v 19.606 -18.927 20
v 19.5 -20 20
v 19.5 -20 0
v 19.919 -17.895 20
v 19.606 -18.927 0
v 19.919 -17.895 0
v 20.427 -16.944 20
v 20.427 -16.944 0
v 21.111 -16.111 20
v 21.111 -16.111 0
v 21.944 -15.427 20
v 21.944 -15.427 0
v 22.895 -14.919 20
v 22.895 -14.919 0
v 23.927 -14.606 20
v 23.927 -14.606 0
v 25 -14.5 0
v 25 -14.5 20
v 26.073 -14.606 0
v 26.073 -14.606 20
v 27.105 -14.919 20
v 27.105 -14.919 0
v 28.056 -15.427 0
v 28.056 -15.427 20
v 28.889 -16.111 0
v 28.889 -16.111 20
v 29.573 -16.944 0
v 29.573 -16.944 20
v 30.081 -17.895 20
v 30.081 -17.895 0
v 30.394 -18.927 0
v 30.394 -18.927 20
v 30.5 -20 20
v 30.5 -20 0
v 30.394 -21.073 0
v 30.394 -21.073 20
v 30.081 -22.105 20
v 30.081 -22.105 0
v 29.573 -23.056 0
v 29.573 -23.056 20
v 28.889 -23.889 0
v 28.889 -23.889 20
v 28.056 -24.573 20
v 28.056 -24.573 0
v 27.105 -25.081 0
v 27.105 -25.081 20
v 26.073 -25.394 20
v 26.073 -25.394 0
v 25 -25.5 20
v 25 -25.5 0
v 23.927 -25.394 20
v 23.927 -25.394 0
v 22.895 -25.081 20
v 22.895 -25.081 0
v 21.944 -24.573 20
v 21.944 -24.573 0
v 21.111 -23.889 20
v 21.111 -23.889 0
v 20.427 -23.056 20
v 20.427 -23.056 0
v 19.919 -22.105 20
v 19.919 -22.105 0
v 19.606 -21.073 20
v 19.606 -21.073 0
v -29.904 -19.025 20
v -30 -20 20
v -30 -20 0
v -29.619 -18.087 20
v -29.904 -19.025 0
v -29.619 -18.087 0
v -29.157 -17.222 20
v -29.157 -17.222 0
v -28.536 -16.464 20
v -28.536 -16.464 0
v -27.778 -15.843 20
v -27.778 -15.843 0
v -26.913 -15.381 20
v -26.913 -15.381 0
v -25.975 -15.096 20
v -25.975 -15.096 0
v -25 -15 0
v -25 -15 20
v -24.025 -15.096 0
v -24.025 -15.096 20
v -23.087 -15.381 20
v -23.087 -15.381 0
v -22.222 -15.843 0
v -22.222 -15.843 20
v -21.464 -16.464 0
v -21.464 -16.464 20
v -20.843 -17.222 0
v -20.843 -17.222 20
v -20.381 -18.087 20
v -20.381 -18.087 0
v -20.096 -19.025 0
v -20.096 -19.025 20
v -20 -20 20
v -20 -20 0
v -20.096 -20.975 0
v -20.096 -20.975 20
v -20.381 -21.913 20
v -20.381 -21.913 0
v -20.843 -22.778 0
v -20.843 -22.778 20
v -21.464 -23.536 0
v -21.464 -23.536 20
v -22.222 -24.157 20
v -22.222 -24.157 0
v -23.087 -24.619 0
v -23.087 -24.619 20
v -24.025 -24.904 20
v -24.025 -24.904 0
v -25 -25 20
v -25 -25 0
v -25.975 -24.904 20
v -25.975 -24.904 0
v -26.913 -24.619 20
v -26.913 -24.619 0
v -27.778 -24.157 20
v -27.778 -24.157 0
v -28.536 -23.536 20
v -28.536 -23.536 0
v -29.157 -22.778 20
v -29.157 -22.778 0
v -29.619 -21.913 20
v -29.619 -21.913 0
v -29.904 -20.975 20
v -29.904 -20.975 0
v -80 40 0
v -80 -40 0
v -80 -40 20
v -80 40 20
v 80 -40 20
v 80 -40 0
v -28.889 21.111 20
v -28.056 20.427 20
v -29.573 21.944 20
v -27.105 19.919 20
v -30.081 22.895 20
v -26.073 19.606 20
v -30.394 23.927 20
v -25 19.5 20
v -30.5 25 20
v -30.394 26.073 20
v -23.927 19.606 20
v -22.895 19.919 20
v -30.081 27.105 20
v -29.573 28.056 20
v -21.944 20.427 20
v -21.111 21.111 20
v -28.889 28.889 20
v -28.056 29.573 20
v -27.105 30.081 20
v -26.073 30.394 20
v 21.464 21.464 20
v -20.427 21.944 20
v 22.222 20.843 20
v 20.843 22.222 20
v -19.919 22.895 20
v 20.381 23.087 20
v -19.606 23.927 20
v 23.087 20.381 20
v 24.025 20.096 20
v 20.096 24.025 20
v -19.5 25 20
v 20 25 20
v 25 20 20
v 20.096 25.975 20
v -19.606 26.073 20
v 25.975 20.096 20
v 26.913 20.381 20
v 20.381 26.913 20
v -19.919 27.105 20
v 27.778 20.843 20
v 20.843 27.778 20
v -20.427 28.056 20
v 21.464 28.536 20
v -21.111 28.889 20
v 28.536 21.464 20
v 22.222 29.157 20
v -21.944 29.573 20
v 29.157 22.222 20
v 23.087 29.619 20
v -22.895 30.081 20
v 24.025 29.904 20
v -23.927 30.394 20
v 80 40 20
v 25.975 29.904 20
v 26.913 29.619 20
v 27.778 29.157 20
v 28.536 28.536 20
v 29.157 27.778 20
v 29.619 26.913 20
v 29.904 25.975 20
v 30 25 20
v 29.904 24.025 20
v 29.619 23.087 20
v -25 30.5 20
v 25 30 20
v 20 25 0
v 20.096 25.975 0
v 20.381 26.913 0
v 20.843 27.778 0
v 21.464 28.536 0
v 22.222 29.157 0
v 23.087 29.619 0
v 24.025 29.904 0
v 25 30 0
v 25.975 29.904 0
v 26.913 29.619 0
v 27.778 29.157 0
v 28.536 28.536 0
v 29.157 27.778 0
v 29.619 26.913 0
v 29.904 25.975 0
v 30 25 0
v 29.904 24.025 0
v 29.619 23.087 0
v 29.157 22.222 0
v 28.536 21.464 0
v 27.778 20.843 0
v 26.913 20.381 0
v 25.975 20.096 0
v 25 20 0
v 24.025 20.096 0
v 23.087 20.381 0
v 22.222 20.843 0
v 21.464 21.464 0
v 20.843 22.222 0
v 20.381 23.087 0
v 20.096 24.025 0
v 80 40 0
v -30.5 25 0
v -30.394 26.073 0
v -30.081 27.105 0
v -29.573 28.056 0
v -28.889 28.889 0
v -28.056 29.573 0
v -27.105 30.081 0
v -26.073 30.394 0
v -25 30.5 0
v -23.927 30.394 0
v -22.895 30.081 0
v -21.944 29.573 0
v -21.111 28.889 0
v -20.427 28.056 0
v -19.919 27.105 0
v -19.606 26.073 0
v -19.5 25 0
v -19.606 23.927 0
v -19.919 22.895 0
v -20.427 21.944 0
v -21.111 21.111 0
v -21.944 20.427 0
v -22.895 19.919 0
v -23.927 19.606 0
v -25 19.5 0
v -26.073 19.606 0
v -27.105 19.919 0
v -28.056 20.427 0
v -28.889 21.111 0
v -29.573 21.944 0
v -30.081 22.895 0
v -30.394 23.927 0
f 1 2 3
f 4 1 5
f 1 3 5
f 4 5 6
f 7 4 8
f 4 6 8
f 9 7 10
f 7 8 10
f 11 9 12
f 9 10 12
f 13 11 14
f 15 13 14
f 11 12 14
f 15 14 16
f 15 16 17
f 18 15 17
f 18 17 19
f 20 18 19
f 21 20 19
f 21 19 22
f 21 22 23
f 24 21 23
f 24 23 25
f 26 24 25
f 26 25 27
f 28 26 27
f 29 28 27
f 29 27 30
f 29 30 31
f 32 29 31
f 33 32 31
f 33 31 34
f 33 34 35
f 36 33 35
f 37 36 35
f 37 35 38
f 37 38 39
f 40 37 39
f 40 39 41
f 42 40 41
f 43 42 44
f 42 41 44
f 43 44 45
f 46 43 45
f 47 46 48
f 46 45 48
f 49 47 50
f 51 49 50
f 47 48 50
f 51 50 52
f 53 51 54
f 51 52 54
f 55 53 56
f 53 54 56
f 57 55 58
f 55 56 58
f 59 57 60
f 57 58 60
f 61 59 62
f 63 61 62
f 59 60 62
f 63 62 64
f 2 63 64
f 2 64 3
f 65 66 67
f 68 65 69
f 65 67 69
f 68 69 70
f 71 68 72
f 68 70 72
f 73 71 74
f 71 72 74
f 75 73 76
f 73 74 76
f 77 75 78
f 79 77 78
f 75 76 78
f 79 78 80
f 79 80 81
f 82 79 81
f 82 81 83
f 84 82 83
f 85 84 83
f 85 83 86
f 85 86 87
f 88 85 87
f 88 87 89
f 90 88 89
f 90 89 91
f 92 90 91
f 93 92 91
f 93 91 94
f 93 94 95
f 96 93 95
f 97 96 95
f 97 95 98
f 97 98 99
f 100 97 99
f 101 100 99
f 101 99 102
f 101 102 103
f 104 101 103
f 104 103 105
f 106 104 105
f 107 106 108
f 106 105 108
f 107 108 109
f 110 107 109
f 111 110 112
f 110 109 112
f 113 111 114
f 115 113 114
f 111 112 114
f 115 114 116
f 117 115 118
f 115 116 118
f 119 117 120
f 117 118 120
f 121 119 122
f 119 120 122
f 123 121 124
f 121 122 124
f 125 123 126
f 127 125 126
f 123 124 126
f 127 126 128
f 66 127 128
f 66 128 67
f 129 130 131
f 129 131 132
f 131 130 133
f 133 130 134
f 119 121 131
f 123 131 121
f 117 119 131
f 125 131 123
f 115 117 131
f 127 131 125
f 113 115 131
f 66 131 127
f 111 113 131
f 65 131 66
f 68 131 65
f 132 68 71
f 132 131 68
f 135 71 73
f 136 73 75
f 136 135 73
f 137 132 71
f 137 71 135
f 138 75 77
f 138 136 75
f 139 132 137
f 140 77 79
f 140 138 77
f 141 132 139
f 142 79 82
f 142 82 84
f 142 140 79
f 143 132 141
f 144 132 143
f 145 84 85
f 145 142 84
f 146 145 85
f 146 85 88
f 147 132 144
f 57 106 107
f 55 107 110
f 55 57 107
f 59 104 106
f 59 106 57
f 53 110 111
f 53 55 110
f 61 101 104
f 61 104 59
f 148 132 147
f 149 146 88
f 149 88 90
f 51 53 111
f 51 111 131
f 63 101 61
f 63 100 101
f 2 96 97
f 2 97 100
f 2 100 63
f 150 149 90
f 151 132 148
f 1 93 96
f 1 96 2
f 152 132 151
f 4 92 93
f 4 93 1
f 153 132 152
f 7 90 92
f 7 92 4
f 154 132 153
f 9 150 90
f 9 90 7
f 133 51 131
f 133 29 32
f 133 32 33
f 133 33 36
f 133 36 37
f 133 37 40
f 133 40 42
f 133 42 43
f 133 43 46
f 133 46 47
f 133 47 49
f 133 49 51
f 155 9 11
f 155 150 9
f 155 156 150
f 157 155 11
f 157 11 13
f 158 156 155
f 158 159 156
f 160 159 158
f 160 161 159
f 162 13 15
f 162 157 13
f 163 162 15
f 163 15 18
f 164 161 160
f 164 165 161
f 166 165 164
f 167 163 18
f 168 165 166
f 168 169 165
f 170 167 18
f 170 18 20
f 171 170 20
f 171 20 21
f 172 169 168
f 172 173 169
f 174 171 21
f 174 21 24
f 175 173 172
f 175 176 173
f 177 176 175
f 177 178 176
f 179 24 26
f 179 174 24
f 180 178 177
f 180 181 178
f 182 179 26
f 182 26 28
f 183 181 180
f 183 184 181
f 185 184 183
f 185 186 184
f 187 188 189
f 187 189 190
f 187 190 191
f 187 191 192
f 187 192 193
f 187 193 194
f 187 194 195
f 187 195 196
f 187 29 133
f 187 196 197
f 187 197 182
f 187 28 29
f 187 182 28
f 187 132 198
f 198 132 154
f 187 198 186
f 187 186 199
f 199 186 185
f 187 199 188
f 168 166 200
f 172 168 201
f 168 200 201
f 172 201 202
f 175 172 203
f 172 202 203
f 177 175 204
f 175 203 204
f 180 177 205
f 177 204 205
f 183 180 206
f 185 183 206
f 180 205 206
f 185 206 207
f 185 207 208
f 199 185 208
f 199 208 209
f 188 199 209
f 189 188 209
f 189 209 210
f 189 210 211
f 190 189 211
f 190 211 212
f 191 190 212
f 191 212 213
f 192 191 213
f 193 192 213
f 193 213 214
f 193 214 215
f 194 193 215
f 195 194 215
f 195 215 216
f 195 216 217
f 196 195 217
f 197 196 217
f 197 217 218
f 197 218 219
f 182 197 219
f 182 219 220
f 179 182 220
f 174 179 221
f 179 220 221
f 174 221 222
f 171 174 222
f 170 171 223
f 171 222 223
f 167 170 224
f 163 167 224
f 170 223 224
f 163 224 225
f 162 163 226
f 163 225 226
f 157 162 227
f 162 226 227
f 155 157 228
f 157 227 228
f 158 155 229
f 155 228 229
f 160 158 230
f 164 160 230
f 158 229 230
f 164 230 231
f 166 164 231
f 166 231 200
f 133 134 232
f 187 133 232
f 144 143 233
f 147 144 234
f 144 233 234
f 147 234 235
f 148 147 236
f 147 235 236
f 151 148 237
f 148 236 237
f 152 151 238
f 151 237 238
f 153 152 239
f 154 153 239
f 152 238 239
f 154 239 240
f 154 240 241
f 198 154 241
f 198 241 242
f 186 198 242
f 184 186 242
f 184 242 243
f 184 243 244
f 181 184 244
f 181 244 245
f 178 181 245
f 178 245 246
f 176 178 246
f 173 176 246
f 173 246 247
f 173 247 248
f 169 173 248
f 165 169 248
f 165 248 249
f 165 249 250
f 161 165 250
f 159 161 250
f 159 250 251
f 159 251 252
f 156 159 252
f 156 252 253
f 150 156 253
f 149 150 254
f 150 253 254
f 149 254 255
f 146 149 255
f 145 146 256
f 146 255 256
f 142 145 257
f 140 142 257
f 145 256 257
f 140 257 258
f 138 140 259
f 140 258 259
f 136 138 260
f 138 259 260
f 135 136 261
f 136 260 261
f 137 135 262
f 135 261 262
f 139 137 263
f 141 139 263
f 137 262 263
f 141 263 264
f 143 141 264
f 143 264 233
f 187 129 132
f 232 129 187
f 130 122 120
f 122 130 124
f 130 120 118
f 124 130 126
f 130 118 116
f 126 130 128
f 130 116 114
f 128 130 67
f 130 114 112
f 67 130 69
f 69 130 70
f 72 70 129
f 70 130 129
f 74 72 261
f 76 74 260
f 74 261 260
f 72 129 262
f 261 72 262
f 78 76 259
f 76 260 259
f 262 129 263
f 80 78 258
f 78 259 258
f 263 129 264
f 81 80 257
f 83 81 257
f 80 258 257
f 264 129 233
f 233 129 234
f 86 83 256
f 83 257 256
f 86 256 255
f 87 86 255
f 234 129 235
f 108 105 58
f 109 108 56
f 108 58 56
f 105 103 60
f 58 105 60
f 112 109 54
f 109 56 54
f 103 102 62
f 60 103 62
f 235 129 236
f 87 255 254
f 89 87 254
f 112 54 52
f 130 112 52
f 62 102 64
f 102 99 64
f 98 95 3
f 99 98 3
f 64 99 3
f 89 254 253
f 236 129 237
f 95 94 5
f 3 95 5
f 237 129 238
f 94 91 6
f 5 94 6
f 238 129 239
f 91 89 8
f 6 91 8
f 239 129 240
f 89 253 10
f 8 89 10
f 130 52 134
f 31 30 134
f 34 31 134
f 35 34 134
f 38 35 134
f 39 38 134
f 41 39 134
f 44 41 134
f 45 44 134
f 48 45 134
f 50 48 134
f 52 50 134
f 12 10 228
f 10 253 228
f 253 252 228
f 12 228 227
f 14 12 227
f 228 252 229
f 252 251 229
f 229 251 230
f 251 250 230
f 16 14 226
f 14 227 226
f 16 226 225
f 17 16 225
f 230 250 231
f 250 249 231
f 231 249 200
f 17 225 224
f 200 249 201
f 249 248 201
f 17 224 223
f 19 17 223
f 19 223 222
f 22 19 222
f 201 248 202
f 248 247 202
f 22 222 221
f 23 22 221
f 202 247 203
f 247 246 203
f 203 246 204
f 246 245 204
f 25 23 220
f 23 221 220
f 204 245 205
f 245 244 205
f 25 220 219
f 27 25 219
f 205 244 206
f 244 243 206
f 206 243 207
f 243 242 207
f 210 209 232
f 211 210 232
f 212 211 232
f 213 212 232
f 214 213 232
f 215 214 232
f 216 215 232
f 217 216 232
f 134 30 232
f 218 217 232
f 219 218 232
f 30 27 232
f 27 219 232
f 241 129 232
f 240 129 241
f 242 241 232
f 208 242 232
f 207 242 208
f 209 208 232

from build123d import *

# Parameters (mm, degrees)
SKETCH_1_W          = 160
SKETCH_1_H          = 80
EXTRUDE_1_DEPTH     = 20
HOLE_WIZARD_M10_1_D = 11
MM_1_D              = 10


with BuildPart() as part:
    # 草图1 → 凸台-拉伸1 (new body)
    with BuildSketch(Plane.XY):
        Rectangle(SKETCH_1_W, SKETCH_1_H)
    extrude(amount=EXTRUDE_1_DEPTH)

    # M10 间隙孔1 (through all)
    with Locations(Plane.XY.offset(20)):
        with Locations((-25, 25), (25, -20)):
            Hole(HOLE_WIZARD_M10_1_D / 2)

    # 大小mm 暗销孔1 (through all)
    with Locations(Plane.XY.offset(20)):
        with Locations((25, 25), (-25, -20)):
            Hole(MM_1_D / 2)


solid = part.part
